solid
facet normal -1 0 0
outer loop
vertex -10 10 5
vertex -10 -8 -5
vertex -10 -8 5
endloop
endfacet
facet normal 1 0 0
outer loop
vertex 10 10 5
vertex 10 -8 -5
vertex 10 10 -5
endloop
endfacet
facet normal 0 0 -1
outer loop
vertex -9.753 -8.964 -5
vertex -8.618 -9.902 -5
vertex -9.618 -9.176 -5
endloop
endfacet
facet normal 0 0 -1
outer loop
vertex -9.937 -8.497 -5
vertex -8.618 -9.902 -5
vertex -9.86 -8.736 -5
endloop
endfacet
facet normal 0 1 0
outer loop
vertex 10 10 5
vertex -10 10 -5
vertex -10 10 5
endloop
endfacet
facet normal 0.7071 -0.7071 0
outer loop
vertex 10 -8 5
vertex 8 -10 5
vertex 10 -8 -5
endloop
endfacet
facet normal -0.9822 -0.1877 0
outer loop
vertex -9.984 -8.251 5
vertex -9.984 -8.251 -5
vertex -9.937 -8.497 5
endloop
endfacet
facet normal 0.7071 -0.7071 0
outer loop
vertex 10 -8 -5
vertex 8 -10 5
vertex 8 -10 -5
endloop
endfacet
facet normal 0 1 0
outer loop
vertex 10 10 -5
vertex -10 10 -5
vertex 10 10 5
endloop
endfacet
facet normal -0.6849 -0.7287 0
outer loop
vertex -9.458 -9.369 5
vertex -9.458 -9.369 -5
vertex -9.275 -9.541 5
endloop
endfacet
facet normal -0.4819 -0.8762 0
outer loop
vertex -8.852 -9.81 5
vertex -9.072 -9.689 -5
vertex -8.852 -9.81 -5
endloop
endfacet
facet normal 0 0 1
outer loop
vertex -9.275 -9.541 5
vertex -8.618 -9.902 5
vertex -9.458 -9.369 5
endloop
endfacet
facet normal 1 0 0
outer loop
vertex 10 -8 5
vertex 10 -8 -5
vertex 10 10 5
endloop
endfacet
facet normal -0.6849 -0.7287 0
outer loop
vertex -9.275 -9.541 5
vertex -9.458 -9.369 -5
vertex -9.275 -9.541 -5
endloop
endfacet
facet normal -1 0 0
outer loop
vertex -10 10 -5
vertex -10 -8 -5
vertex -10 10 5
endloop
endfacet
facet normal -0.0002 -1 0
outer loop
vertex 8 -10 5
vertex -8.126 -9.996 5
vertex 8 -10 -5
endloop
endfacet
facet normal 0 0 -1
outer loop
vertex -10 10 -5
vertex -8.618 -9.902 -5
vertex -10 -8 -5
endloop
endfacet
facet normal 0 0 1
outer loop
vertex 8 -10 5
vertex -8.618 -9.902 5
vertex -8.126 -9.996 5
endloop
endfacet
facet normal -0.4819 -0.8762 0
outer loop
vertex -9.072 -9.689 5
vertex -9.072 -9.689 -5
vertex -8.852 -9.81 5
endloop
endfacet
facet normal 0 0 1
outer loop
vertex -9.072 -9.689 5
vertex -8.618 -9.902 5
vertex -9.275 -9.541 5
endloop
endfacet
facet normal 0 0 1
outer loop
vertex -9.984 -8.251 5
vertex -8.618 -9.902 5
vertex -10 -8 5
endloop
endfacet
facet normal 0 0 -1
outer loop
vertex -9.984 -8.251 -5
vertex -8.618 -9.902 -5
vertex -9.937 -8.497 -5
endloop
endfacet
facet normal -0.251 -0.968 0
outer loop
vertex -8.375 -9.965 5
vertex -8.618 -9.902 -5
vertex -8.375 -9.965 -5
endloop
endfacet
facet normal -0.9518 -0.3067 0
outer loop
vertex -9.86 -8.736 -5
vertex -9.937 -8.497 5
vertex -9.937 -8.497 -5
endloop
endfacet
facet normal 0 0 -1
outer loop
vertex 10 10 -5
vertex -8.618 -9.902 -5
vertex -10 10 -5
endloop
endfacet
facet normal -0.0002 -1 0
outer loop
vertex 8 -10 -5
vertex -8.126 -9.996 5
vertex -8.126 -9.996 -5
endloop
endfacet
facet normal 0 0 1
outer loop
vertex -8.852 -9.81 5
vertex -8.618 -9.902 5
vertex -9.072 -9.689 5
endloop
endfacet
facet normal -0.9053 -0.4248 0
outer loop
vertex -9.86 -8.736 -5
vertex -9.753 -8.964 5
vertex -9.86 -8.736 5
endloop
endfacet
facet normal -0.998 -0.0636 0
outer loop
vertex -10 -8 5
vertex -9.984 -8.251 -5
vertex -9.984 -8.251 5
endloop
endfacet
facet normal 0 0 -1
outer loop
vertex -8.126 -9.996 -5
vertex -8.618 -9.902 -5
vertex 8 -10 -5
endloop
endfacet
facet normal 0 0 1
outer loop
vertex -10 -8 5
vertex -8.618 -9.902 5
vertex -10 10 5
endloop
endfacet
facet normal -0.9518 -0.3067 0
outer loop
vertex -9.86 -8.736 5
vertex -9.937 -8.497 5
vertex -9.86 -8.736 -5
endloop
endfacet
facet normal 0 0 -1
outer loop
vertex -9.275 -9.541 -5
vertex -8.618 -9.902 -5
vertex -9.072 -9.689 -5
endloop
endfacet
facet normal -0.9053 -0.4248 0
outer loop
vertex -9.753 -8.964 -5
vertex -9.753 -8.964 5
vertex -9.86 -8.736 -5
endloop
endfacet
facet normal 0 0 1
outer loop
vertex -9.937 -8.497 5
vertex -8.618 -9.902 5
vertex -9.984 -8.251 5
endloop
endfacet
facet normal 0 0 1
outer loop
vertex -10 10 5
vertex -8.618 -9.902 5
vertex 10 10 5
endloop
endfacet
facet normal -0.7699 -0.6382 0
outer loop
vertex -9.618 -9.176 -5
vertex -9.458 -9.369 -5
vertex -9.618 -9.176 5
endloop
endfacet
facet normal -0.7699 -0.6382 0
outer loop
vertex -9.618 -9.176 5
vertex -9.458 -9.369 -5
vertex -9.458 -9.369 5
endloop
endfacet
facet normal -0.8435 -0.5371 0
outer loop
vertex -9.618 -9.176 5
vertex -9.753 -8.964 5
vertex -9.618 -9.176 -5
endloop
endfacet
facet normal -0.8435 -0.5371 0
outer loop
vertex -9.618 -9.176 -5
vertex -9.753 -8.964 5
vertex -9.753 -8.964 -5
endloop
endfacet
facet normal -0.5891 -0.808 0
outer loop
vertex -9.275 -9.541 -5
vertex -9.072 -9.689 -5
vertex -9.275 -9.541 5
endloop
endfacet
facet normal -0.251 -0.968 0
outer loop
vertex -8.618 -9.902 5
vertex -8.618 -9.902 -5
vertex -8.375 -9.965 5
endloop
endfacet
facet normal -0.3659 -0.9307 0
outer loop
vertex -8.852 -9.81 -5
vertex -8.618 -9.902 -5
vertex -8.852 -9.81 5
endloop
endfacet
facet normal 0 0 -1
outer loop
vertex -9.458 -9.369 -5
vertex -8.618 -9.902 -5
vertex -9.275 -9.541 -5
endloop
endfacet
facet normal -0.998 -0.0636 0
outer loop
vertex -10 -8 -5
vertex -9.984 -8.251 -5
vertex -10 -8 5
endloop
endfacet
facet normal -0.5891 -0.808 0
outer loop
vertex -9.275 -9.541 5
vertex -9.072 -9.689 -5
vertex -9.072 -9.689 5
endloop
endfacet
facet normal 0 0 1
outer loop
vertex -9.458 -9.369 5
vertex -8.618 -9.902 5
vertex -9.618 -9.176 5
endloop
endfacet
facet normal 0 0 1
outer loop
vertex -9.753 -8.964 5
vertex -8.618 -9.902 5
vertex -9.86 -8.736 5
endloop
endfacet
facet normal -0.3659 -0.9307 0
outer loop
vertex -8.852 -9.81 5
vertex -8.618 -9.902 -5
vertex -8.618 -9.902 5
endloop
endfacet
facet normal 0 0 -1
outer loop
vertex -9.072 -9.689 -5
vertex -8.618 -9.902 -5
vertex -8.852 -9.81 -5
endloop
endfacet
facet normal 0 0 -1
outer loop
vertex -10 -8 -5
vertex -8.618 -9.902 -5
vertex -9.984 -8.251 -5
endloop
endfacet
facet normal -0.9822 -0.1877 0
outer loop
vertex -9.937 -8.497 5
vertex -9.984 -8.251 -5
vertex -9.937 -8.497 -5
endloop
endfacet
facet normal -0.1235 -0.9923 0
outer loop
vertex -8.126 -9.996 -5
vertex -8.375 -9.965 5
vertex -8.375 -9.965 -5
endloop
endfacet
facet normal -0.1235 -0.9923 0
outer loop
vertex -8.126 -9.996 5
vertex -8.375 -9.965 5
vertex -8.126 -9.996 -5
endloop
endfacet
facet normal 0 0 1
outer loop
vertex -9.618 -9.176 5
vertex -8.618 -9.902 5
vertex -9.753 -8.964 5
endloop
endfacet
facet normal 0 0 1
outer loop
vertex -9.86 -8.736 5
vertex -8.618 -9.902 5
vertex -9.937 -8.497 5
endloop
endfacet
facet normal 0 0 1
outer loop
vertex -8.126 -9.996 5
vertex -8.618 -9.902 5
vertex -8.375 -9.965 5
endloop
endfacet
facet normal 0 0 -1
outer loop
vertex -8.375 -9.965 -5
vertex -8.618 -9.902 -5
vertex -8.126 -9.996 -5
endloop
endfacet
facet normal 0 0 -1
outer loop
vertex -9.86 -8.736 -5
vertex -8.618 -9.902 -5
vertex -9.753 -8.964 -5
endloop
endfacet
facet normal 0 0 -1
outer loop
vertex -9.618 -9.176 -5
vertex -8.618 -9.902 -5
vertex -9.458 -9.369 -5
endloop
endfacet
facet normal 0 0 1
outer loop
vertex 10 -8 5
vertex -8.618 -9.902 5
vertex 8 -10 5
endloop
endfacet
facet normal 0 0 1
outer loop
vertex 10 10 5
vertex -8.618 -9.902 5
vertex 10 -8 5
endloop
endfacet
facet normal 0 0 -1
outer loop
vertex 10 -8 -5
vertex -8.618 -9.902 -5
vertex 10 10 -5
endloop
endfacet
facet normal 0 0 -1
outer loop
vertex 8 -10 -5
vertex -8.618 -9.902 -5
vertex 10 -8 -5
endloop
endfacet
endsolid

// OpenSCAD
// file: 13.Cilindros condicionales.scad
//-- Cilindro redondeado en las tapas
module rcylinder(
    r=4,
    h=20,
    center=false,
    both=false,
    $fn=30,
){
    //-- Calcular altura cilindro interior:
    //-- 2 tapas: h-2*r
    //-- 1 tapa: h-r
    hc=(both==true) ? h-2*r : h-r;

    //-- Calcular traslación para centrar el cilindro
    posc=(center==true) ? 0 : h/2;

    //-- Aplicar traslación para el centrado
    translate([0,0,posc]){
        if(both==true){
            //-- Cilindro con ambas tapas redondeadas
            cylinder(r=r,h=hc,center=true,$fn=$fn);
            //-- Esferas
            for(i=[-1,1])
                translate([0,0,i*hc/2])
                    sphere(r=r);
        }else{
            //-- Cilindro con una tapa redondeada
            translate([0,0,-h/2]){
                cylinder(r=r,h=hc,$fn=$fn);
                translate([0,0,hc])
                    sphere(r=r,$fn=$fn);
            }
        }
    }
}

//-- Ejemplos
r=5;
h=30;
center=false;
$fn=30;

//-- Cilindro normal
translate([-3*r,0,0])
    cylinder(r=r,h=h,center=center,$fn=$fn);

//-- Cilindro con tapa superior redondeada
rcylinder(r=r,h=h,both=false,center=center,$fn=$fn);

//-- Cilindro con ambas tapas redondeadas
translate([3*r,0,0])
    rcylinder(r=r,h=h,both=true,center=center,$fn=$fn);
// main file
use <13.Cilindros condicionales.scad>

X=0;
Y=1;
Z=2;

//-- Parámetros del cubo
size=[20,20,10];
r=2;

//-- Calcular esquinas cuadrante 1
xc=size[X]/2-r;
yc=size[Y]/2-r;
zc=size[Z]/2;

//-- Tamaño columnas cuadradas
col_size=[2*r,2*r,size[Z]];

//-- Posiciones de las columnas
vertex=[
    [xc,yc,0],
    [-xc,yc,0],
    [-xc,-yc,0],
    [xc,-yc,0],
];

//-- Ejemplo 1: modificación aristas verticales
module example1(){
    hull(){
        for(v=[0:1])
            translate(vertex[v])
                cube(col_size,center=true);
                //cylinder(r=r,h=size[Z],center=true,$fn=4);

        translate(vertex[2])
            cylinder(r=r,h=size[Z],center=true,$fn=50);

        translate(vertex[3])
            cylinder(r=r,h=size[Z],center=true,$fn=4);
    }
}

//-- Ejemplo 2: modificación aristas horizontales y verticales
module example2(){
    hull(){
        for(v=[0:3])
            translate(vertex[v])
                //cylinder(r=r,h=size[Z],center=true,$fn=50);
                rcylinder(r=r,h=size[Z],both=false,center=true,$fn=40);
                //rcylinder(r=r,h=size[Z],both=true,center=true,$fn=40);
    }
}

//-- Ejemplos
example1();
//example2();
